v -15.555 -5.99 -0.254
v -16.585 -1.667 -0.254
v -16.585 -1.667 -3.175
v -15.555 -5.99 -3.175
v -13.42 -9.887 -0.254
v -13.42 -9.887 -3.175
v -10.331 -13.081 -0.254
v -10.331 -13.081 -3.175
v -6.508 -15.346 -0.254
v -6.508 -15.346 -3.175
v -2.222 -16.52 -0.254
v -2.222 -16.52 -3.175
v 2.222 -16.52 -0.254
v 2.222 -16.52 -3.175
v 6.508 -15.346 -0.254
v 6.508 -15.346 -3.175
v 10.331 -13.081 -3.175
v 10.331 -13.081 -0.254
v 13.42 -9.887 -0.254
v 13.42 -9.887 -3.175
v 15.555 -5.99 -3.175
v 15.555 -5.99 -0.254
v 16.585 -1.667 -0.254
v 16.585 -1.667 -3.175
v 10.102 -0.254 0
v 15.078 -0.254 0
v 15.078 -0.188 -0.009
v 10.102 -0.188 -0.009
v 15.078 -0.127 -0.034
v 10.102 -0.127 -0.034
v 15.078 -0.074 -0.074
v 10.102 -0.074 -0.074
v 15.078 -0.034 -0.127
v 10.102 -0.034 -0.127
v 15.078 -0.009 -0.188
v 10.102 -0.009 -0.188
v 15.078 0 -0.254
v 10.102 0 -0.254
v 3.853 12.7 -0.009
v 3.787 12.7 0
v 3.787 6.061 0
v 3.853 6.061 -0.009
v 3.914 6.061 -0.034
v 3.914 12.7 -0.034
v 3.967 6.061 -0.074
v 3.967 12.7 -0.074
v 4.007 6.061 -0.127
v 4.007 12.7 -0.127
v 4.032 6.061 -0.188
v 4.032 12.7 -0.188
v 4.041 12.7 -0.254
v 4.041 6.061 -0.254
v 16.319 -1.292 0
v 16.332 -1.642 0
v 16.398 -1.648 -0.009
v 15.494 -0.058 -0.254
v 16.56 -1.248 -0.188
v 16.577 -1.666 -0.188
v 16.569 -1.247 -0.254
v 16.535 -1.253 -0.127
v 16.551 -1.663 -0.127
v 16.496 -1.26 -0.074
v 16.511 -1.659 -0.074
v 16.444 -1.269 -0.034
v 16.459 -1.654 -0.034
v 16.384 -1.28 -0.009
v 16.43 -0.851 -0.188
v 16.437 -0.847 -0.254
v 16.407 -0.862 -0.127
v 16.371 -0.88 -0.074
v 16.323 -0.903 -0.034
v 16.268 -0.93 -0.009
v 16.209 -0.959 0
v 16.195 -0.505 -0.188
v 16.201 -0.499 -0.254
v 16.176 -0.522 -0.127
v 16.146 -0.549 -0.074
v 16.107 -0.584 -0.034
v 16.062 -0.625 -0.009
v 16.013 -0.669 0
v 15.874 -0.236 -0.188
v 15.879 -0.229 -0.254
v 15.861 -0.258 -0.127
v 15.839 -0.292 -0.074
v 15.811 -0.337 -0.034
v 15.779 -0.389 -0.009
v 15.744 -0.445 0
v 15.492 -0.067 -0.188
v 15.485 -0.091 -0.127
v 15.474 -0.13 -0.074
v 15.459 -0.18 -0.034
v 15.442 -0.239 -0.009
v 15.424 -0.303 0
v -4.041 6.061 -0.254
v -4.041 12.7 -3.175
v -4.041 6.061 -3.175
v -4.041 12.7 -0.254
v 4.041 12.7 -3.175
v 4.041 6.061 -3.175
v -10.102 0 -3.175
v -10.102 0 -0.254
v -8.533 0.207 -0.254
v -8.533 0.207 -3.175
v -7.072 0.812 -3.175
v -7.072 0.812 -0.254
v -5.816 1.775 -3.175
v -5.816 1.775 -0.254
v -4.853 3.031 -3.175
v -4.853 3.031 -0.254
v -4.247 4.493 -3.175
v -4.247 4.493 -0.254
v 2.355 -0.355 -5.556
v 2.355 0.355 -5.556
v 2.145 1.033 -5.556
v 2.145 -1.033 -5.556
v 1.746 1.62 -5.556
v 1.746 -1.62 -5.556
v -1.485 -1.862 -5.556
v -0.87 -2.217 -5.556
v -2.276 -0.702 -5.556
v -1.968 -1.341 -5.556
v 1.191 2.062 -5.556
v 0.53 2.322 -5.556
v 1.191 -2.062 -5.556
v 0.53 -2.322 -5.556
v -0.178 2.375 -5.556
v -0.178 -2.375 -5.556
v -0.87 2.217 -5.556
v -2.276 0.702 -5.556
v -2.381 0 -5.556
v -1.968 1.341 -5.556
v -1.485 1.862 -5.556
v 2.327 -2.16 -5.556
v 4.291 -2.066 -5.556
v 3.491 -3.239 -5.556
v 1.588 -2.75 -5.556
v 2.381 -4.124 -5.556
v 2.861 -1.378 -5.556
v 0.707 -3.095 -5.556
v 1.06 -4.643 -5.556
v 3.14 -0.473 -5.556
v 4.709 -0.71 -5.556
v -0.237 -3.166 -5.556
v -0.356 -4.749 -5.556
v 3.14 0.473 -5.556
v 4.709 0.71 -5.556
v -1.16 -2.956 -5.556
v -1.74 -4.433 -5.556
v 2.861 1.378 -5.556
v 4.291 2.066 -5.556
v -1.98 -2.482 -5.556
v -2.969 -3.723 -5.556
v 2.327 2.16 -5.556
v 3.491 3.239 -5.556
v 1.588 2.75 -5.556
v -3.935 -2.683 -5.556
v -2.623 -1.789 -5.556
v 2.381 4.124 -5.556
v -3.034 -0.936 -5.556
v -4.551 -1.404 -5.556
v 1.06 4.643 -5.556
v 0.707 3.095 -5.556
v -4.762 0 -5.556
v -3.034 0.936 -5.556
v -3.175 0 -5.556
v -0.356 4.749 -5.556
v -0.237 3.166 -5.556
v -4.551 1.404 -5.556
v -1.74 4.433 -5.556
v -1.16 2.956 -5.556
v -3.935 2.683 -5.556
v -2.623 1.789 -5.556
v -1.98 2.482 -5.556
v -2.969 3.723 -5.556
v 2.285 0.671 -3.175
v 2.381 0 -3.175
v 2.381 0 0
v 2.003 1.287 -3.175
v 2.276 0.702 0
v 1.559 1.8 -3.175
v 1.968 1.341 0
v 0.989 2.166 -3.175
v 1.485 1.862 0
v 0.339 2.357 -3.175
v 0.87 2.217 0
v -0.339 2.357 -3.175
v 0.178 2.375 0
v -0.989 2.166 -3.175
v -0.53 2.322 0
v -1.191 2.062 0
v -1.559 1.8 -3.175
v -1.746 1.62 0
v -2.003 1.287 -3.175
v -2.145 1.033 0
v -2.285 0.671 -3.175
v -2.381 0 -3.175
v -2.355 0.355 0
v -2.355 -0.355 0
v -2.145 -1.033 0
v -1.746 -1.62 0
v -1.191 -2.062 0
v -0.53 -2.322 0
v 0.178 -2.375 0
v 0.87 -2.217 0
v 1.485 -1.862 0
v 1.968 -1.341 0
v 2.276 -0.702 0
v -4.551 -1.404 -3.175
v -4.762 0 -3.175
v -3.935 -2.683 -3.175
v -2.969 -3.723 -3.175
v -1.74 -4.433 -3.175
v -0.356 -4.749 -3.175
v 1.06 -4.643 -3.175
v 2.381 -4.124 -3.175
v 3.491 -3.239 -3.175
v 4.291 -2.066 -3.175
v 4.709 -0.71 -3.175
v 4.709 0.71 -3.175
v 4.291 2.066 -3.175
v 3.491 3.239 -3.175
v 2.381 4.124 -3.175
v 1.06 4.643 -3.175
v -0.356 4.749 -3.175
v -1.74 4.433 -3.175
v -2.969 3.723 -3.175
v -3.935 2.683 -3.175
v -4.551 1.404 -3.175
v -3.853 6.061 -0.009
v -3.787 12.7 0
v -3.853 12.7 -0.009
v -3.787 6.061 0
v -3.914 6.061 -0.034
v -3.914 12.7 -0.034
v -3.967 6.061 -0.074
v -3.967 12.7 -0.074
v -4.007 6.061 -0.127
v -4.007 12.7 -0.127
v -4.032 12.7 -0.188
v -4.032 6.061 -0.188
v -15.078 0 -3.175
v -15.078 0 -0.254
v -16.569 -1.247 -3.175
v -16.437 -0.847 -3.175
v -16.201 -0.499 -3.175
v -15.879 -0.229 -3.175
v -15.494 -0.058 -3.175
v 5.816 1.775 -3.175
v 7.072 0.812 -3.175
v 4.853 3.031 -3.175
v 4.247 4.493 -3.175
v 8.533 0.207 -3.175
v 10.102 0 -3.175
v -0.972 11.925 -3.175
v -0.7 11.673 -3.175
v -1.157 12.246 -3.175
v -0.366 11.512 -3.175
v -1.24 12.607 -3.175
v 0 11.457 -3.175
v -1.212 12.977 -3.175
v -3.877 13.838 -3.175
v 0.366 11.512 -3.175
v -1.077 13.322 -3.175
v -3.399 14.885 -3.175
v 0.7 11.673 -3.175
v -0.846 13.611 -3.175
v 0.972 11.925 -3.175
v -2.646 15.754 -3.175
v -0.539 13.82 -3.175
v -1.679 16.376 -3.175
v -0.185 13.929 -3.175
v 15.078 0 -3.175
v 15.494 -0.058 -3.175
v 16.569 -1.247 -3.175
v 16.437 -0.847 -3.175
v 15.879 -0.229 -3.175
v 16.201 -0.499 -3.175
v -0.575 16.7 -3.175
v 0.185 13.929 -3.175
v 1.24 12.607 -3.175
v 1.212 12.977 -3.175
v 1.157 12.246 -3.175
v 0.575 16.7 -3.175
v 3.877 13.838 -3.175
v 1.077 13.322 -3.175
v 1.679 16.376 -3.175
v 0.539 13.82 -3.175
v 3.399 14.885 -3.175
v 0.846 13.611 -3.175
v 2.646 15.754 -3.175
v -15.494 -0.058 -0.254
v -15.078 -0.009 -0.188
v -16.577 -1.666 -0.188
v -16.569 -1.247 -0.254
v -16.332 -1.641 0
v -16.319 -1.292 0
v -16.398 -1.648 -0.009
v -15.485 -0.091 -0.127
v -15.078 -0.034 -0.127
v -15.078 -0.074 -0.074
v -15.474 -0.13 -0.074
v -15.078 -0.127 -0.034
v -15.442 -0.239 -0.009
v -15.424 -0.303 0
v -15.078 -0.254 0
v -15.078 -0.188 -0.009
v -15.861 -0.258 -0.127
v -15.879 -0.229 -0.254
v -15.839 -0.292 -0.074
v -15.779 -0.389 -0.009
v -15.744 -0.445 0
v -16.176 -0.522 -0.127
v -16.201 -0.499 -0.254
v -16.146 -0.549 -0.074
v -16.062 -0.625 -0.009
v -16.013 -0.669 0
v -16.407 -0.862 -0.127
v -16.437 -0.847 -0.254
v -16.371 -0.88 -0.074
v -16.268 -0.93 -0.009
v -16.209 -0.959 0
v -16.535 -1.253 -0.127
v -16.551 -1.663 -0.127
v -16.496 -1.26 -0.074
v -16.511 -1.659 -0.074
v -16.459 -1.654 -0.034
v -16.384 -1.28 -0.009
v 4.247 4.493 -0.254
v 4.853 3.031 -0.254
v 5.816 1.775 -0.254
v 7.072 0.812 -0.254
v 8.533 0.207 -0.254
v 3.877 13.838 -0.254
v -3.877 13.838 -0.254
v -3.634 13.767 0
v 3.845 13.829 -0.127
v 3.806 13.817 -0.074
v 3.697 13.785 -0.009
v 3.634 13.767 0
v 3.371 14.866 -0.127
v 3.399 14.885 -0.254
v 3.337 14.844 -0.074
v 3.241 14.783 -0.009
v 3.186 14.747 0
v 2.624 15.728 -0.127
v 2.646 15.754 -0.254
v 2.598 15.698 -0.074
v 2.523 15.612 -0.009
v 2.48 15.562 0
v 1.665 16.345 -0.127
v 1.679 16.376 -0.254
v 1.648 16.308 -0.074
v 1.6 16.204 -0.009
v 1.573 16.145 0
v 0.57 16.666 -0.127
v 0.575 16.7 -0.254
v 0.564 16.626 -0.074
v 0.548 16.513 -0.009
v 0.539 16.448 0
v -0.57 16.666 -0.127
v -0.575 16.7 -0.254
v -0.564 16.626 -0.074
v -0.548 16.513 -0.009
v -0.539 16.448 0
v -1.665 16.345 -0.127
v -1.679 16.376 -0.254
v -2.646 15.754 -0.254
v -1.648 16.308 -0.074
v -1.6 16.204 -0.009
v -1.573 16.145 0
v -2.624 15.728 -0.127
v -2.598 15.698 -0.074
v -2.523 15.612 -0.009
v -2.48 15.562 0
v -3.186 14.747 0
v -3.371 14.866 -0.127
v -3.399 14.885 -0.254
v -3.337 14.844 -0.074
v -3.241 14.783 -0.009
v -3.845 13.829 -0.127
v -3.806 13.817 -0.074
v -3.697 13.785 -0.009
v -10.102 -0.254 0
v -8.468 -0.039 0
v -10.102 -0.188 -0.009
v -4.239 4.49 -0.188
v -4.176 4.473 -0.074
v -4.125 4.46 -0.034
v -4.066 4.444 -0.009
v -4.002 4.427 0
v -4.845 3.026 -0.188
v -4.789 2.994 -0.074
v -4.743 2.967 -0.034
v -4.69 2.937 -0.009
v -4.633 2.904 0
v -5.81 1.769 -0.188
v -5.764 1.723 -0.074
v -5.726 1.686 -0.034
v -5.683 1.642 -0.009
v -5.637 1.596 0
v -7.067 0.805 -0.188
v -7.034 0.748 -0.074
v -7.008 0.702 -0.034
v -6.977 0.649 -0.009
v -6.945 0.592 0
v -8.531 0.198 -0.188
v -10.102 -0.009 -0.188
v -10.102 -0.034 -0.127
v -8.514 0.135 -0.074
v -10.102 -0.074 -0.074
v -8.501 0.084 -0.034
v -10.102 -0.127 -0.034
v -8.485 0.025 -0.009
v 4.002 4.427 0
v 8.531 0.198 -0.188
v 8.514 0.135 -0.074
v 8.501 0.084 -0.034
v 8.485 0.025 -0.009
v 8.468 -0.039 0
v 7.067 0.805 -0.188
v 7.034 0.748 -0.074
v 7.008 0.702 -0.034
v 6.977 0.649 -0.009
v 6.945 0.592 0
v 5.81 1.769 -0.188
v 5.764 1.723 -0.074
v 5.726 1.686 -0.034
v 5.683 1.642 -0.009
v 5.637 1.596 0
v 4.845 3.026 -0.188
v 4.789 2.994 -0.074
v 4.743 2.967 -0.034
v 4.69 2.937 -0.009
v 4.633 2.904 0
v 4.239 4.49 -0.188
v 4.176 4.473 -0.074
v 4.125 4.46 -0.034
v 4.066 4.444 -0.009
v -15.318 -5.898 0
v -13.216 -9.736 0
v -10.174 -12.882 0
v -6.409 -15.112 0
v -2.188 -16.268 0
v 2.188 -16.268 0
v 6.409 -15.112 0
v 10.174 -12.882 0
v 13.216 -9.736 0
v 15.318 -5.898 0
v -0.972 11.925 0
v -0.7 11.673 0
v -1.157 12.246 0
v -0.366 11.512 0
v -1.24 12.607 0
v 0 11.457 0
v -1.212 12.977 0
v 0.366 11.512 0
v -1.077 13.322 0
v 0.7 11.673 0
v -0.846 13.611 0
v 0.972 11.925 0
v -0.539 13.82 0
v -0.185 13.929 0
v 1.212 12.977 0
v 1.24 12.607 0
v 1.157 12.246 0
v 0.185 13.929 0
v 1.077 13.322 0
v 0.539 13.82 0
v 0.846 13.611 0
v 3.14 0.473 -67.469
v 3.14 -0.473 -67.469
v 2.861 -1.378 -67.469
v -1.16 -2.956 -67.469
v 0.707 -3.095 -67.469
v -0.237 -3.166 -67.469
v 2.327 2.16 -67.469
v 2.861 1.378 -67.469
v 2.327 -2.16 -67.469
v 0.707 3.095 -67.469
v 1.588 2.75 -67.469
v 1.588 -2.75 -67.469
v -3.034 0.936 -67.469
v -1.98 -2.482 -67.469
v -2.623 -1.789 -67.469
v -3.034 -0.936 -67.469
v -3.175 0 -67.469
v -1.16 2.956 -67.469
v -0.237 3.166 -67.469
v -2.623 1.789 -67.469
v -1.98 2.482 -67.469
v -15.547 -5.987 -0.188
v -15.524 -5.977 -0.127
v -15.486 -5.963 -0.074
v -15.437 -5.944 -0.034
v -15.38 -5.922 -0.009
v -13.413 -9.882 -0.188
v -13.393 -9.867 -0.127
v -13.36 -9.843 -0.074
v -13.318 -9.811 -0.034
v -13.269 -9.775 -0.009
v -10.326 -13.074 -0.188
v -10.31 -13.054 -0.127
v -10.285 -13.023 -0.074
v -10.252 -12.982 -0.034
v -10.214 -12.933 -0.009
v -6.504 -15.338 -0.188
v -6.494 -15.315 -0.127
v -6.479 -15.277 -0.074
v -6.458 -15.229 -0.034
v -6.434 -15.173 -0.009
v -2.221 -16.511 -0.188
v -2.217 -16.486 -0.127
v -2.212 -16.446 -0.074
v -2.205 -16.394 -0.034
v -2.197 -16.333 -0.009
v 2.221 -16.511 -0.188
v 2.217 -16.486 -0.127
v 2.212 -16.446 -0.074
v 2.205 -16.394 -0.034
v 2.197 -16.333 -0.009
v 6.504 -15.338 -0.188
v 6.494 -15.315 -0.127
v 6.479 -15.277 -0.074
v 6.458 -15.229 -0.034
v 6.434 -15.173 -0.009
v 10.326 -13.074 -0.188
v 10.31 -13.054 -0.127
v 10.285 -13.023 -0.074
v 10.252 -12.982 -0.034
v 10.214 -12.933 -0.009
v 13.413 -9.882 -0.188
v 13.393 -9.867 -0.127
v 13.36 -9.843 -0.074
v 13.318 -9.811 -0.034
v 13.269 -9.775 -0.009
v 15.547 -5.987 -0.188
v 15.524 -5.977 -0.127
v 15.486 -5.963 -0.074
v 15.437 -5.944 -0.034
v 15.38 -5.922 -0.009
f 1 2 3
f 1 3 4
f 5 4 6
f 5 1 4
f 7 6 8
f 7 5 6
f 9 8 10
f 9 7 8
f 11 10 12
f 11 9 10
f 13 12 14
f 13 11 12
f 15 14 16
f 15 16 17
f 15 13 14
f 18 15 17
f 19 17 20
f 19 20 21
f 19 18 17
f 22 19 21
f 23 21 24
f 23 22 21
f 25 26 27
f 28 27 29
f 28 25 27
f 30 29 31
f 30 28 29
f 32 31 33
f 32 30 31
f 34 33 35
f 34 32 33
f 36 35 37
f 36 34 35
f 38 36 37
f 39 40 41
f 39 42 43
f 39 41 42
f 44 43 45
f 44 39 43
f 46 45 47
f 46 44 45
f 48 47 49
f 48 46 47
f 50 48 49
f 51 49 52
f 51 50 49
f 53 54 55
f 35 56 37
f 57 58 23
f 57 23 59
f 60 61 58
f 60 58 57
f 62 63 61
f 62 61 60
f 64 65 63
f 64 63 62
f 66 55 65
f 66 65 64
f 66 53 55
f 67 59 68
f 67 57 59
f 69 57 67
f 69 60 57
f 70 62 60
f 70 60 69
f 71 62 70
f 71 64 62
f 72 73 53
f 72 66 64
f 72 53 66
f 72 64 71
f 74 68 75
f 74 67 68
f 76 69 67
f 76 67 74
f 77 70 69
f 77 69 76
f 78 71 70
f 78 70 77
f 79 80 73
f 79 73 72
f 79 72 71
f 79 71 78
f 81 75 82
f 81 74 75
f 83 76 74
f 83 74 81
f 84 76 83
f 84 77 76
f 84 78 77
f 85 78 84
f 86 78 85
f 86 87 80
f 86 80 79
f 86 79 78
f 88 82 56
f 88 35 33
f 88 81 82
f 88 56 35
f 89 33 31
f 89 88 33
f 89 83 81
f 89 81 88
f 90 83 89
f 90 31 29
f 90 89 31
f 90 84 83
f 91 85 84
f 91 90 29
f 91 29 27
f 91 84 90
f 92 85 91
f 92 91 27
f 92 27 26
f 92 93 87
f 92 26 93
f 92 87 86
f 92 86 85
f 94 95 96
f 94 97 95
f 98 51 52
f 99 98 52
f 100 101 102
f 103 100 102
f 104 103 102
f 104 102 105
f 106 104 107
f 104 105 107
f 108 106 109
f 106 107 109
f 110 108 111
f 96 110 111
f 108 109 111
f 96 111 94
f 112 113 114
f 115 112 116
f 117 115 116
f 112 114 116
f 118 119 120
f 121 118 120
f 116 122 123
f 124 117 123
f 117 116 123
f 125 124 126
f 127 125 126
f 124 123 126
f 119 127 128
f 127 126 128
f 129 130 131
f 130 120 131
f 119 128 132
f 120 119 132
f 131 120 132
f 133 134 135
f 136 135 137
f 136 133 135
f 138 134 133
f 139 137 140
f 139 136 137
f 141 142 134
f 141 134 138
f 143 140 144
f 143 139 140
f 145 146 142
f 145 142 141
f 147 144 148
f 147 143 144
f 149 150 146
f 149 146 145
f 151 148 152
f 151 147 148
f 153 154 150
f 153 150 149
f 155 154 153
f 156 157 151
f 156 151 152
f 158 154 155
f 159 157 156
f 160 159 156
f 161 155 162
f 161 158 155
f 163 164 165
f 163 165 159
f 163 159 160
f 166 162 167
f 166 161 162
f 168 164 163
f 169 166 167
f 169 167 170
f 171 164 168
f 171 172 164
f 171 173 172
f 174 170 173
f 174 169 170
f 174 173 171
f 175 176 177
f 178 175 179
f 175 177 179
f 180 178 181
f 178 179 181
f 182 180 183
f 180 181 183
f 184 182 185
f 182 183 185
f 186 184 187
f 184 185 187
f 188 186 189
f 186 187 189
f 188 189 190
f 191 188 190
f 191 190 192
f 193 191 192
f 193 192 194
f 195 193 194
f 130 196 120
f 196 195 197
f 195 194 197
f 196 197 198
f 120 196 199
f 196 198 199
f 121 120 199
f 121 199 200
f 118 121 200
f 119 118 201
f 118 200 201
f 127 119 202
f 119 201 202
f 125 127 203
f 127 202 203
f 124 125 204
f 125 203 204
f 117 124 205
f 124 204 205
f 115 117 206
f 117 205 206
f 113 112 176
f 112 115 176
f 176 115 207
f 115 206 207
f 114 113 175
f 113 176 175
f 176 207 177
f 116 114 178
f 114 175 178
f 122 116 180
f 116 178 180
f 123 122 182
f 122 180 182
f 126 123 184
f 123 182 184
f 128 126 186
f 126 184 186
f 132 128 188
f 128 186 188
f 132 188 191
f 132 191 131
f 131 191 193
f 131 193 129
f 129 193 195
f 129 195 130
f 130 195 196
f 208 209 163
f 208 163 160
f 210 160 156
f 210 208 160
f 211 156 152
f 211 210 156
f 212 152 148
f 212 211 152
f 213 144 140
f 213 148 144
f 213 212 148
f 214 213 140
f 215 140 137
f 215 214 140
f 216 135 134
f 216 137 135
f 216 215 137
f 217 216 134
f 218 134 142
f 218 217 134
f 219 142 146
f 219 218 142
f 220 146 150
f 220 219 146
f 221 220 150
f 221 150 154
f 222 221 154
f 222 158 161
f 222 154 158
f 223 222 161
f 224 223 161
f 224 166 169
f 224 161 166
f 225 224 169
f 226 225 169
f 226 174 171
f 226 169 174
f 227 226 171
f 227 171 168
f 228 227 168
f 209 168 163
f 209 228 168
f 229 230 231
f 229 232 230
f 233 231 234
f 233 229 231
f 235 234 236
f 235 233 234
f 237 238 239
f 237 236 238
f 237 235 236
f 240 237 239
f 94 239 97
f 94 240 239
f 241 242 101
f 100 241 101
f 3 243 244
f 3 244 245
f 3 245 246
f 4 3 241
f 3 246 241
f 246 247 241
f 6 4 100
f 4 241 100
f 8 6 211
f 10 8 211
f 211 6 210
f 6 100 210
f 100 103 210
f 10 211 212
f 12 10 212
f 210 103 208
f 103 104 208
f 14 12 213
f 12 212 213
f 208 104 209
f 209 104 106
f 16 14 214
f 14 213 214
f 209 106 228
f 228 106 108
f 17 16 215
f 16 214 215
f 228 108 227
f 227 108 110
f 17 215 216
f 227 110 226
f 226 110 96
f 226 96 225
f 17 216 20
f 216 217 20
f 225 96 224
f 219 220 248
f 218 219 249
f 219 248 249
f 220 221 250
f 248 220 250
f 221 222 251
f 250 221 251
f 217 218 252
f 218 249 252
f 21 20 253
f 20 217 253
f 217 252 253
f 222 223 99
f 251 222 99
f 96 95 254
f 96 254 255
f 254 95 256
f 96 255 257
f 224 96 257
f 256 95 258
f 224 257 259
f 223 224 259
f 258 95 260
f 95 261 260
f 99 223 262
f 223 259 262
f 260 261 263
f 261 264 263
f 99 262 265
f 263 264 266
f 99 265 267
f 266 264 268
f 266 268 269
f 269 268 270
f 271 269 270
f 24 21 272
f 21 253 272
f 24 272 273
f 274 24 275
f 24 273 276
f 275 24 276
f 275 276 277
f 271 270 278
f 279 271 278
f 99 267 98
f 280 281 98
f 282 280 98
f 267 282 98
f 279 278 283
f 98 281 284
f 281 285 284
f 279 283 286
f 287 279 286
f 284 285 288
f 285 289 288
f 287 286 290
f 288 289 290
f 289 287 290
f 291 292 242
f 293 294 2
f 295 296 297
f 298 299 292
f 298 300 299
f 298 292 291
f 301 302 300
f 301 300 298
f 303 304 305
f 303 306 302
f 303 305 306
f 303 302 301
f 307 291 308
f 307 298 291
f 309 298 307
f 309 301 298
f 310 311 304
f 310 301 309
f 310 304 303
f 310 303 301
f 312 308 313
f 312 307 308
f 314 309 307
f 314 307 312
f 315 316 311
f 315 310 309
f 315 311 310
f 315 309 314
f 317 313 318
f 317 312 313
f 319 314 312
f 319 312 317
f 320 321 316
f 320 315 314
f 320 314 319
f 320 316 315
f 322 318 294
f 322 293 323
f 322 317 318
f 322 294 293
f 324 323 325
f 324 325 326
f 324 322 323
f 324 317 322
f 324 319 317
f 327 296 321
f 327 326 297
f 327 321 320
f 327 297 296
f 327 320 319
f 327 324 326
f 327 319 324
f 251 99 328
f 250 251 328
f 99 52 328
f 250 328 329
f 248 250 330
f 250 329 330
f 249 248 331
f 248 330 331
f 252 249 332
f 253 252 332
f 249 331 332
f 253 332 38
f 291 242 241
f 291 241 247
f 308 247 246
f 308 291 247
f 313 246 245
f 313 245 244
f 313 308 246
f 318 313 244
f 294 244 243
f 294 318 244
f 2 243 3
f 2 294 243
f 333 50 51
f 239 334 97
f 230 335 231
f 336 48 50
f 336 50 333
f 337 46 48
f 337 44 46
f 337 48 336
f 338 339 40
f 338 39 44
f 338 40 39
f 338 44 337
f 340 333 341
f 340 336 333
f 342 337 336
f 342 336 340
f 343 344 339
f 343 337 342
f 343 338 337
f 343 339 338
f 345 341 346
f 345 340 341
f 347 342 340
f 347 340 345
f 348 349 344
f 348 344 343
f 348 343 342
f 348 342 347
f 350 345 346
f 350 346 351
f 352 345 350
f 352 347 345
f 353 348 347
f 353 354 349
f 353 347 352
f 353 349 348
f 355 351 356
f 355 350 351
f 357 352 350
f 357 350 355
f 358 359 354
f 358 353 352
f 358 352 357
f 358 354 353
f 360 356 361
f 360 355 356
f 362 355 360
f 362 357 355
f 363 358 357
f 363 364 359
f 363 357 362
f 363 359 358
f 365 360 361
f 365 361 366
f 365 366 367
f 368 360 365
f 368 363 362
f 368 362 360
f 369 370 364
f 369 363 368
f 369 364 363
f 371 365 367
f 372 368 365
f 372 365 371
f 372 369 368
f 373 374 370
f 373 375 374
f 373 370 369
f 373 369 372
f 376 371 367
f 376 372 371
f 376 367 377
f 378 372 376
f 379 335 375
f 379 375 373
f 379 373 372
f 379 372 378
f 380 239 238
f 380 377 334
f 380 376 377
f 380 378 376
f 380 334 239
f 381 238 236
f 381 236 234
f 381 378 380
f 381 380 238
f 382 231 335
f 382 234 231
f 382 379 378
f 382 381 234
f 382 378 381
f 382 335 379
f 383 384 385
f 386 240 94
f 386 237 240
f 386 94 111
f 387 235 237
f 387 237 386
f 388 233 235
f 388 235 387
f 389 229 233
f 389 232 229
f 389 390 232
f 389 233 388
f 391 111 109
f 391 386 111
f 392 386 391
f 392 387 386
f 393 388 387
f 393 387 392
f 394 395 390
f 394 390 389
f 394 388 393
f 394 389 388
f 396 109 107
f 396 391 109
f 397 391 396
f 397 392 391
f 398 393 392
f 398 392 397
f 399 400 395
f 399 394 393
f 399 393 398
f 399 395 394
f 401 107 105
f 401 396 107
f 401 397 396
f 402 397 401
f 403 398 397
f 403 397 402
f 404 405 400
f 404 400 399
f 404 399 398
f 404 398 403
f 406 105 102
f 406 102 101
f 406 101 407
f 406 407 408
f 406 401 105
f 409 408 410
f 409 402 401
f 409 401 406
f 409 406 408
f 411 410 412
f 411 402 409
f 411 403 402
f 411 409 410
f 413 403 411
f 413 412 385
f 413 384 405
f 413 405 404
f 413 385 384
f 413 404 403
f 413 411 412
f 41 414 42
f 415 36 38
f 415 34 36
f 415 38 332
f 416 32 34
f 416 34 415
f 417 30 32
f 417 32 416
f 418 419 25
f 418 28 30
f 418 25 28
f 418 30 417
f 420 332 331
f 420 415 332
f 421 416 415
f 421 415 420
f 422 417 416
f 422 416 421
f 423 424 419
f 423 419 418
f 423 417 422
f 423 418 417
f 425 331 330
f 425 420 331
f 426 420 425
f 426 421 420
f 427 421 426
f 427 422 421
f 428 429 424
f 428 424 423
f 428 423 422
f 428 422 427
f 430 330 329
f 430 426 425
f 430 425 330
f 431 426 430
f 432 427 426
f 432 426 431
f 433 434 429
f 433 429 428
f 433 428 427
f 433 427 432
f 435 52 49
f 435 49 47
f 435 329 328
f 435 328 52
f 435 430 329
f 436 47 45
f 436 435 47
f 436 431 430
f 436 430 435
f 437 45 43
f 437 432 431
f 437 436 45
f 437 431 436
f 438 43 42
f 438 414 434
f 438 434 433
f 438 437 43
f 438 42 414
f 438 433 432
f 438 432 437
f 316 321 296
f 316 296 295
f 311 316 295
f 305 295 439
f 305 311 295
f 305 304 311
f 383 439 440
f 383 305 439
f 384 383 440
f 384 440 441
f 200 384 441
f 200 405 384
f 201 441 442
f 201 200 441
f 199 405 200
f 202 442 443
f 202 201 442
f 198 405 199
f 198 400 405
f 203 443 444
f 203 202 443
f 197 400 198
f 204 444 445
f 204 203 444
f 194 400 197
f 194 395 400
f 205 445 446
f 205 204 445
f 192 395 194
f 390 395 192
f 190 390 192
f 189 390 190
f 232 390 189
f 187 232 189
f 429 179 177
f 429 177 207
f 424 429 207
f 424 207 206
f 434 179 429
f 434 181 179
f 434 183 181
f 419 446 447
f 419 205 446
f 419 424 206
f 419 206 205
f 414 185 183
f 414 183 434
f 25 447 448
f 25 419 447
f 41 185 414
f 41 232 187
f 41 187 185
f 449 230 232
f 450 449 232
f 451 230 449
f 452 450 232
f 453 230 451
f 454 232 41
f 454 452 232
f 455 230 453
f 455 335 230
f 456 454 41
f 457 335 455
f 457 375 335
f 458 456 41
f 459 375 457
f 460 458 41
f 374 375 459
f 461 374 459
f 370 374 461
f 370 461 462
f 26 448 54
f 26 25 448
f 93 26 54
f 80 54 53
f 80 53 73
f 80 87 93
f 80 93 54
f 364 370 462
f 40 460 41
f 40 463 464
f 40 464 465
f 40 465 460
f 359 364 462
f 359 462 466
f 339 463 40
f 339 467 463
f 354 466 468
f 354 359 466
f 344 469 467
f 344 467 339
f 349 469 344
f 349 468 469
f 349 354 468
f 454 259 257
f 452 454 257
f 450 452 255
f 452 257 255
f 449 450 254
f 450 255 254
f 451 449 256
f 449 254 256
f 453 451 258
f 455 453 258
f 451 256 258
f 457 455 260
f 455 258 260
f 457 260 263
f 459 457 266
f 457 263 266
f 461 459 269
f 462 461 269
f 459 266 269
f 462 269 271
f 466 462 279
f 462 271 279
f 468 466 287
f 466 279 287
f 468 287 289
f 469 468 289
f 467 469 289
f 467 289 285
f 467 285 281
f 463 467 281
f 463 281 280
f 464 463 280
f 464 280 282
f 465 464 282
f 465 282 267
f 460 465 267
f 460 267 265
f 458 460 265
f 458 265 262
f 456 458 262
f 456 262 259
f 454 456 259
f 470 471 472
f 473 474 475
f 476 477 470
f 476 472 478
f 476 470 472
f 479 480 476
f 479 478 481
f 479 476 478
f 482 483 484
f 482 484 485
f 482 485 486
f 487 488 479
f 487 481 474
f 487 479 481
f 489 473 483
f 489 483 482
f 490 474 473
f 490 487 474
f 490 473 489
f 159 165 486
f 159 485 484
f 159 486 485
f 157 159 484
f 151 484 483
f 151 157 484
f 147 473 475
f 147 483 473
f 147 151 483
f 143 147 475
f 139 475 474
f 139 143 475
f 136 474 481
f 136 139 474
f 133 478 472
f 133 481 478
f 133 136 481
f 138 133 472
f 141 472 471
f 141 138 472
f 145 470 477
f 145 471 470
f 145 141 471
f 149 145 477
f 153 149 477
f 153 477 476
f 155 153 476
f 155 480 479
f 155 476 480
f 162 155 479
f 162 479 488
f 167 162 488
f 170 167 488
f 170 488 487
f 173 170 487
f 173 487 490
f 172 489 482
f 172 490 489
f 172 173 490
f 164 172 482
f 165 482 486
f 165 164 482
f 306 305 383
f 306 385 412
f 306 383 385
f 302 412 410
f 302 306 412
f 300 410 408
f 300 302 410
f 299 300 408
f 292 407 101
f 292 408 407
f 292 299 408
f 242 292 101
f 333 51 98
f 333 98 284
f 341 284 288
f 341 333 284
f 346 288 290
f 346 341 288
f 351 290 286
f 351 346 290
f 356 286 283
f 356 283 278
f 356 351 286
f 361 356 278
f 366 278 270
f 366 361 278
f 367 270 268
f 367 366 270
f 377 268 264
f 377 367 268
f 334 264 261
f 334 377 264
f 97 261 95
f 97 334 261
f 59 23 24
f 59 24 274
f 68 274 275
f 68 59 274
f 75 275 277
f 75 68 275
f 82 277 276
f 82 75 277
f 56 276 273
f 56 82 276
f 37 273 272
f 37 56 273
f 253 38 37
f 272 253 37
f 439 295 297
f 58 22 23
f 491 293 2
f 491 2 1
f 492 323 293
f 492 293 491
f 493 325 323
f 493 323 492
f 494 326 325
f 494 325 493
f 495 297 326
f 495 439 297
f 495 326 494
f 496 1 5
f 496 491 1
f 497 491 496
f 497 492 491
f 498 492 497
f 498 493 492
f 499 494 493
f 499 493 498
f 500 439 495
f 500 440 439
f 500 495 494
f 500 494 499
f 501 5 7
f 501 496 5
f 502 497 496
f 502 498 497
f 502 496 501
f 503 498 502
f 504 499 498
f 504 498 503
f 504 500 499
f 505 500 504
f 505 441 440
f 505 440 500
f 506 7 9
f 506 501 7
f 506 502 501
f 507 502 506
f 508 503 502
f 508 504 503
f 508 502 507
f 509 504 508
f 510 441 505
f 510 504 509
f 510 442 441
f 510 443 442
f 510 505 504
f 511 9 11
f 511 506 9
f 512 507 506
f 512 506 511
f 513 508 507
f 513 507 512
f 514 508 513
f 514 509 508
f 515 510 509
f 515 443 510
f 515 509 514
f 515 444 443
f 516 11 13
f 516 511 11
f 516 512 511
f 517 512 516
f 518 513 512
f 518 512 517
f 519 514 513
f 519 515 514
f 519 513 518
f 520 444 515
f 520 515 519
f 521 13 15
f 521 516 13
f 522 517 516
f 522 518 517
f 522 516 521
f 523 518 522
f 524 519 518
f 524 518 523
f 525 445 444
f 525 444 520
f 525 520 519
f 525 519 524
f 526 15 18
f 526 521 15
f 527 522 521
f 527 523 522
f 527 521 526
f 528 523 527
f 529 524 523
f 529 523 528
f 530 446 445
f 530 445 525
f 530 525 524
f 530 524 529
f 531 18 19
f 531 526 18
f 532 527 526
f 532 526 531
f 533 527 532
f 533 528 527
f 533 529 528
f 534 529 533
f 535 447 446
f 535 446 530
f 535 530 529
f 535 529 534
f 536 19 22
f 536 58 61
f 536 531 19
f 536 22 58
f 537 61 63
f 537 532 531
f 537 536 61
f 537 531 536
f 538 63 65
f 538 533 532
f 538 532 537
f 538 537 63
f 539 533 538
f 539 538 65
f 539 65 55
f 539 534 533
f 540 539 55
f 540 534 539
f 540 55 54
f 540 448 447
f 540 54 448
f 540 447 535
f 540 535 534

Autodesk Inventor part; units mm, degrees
ref_plane "YZ Plane" through (0, 0, 0) normal (1, 0, 0) x (0, 1, 0)
ref_plane "XZ Plane" through (0, 0, 0) normal (0, 1, 0) x (-1, 0, 0)
ref_plane "XY Plane" through (0, 0, 0) normal (0, 0, 1) x (1, 0, 0)
sketch "Boceto1" plane through (0, 0, 0) normal (0, 0, 1) x (1, 0, 0)
  circle A0 centre (0, 0) radius 2.3813
  arc A1 (4.0409, 12.7) -> (-4.0409, 12.7) centre (0, 12.7) ccw
  arc A2 (-10.1023, 0) -> (-4.0409, 6.0614) centre (-10.1023, 6.0614) ccw
  line L0 (-4.0409, 12.7) -> (-4.0409, 6.0614)
  line L1 (4.0409, 12.7) -> (4.0409, 6.0614)
  arc A3 (4.0409, 6.0614) -> (10.1023, 0) centre (10.1023, 6.0614) ccw
  arc A4 (-15.0775, 0) -> (-16.5852, -1.6669) centre (-15.0775, -1.5153) ccw
  line L2 (-23.7372, 0) -> (23.7372, 0) construction
  arc A5 (16.5852, -1.6669) -> (15.0775, 0) centre (15.0775, -1.5153) ccw
  arc A6 (-16.5852, -1.6669) -> (16.5852, -1.6669) centre (0, 0) ccw
  line L3 (10.1023, 0) -> (15.0775, 0)
  line L4 (-15.0775, 0) -> (-10.1023, 0)
  dimension "d1" = 4.7625
  dimension "d2" = 8.0818
  dimension "d3" = 12.1227
  dimension "d5" = 12.7
  dimension "d6" = 3.0307
extrude "Extrusión1" add sketch "Boceto1" against normal blind 3.175
sketch "Boceto2" plane through (0, 0, 0) normal (0, 0, 1) x (1, 0, 0)
  line L0 (0, 0) -> (0, 12.7) construction
  line L1 (0, 0) -> (12.7, 0) construction
  dimension "d9" = 12.7
  dimension "d10" = 90
hole "Agujero1" at (0, 12.7, 0) direction (0, 0, -1) diameter 2.4867 end through all thread size "5-40 UNC" class "2B" standard "ANSI Unified Screw Threads"
sketch "Boceto3" plane through (0, 0, -3.175) normal (0, 0, -1) x (-1, 0, 0)
  circle A0 centre (0, 0) radius 4.7625
  circle A1 centre (0, 0) radius 2.3813
  dimension "d18" = 9.525
  dimension "d19" = 4.7625
extrude "Extrusión2" add sketch "Boceto3" along normal blind 2.3813
sketch "Boceto4" plane through (0, 0, -5.5563) normal (0, 0, -1) x (-1, 0, 0)
  circle A0 centre (0, 0) radius 3.175
  dimension "d22" = 6.35
extrude "Extrusión3" add sketch "Boceto4" along normal blind 61.9125
fillet "Empalme1" radius 0.254 10 edges at (-4.0409, 9.3807, 0) (-5.8162, 1.7753, 0) (-12.5899, 0, 0) (-16.2013, -0.4988, 0) (0, -16.6688, 0) (16.2013, -0.4988, 0) (12.5899, 0, 0) (5.8162, 1.7753, 0) (4.0409, 9.3807, 0) (0, 16.7409, 0)
properties part number "CrankShaft"
